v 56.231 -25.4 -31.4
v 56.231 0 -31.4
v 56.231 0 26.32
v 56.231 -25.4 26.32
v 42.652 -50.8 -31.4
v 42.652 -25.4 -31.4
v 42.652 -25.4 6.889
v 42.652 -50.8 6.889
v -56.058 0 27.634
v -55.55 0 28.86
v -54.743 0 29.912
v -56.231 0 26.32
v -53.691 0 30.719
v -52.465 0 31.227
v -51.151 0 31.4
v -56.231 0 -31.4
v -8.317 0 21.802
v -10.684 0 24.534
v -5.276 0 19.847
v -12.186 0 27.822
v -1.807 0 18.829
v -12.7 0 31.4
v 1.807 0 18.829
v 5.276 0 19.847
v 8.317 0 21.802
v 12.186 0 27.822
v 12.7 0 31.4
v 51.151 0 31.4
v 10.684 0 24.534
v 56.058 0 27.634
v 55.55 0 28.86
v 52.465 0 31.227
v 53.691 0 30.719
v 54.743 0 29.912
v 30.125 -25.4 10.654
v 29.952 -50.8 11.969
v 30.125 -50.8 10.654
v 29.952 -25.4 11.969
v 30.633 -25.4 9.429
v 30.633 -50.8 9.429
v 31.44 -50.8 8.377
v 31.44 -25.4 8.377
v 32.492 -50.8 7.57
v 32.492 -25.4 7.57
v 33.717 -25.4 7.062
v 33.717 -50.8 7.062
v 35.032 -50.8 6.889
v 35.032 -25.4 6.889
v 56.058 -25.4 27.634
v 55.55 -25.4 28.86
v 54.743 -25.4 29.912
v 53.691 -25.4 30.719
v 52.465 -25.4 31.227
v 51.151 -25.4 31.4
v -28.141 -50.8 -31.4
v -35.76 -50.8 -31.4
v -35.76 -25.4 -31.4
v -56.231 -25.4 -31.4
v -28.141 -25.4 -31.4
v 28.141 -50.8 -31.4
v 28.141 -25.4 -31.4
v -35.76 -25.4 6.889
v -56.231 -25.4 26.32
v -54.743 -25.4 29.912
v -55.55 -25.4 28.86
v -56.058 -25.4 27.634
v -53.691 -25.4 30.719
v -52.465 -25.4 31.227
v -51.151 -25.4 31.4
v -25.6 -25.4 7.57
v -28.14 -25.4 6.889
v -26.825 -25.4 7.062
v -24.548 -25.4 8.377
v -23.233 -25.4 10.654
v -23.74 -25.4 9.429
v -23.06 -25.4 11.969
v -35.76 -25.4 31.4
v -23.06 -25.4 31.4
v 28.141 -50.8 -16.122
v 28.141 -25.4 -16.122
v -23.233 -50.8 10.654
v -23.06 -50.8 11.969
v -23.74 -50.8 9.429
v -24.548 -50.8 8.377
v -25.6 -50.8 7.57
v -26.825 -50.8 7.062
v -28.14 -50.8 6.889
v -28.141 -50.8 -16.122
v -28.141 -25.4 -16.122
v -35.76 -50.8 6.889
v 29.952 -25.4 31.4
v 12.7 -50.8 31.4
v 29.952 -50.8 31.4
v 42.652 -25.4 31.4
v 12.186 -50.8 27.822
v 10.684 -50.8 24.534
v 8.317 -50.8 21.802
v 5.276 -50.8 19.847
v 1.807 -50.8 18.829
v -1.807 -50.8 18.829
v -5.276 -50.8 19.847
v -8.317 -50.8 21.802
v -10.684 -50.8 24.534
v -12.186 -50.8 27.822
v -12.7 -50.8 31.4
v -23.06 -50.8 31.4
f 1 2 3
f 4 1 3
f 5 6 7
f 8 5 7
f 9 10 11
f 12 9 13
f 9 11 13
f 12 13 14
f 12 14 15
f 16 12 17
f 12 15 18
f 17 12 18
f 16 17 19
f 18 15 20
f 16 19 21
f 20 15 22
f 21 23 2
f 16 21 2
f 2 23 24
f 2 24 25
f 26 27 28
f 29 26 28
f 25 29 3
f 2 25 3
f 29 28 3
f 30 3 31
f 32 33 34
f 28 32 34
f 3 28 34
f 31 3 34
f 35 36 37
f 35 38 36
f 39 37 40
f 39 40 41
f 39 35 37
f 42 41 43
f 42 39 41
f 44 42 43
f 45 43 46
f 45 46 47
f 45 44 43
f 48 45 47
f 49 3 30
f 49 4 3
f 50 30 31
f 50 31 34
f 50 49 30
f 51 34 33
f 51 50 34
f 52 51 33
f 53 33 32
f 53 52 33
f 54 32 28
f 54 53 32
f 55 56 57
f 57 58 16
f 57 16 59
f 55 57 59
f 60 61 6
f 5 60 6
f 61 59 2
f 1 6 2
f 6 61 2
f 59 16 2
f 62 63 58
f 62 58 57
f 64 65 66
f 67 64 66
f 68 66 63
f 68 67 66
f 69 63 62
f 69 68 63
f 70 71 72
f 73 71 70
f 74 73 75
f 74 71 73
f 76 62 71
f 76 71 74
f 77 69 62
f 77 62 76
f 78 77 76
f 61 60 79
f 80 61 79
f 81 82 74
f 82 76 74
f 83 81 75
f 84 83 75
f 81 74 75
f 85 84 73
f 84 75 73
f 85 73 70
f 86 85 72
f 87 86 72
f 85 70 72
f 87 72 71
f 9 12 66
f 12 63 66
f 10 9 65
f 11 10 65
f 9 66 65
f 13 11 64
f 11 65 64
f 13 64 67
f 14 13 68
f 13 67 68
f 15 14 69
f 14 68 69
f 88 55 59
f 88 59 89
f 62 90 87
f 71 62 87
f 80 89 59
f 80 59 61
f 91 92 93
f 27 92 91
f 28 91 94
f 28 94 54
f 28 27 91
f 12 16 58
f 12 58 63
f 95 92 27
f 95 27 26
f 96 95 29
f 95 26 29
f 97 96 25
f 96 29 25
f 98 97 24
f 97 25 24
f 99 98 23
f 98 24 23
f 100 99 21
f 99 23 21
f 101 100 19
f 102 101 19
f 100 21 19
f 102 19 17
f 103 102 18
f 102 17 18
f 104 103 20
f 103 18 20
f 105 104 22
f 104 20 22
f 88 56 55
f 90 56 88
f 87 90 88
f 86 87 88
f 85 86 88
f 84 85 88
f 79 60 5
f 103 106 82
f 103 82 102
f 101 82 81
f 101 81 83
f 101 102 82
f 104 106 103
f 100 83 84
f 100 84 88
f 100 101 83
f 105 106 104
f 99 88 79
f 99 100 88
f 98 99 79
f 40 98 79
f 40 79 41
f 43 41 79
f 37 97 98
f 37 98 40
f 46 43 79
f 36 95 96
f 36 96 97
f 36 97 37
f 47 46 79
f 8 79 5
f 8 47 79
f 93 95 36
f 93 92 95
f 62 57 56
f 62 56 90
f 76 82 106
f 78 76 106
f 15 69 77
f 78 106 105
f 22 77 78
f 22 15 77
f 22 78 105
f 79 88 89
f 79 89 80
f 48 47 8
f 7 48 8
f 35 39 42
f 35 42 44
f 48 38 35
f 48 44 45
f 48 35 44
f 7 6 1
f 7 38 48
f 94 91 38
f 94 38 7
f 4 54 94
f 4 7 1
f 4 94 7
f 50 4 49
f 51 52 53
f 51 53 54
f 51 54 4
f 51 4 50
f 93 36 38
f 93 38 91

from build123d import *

# Parameters (mm, degrees)
F0_W      = 112.4612912536
F0_H      = 62.7993419766
F1_DEPTH  = 25.4
F2_R      = 5.08
F3_W      = 78.4117951989
F3_H      = 62.7993419766
F4_DEPTH  = 25.4
F5_W      = 12.7
F5_H      = 50.8
F7_W      = 56.2817417085
F7_H      = 15.2776930481
F8_DEPTH  = 25.4
F9_W      = 12.7
F9_H      = 24.5103910565
F10_DEPTH = 25.4
F11_R     = 5.08
F12_R     = 5.08


with BuildPart() as f1:
    # F0 (on Front) → F1 (new body)
    with BuildSketch(Plane.XZ):
        Rectangle(F0_W, F0_H)
    extrude(amount=F1_DEPTH)

    # F2
    f2_edges = [f1.edges().sort_by_distance(p)[0] for p in [
        (-56.230646, -12.7, 31.399671),
        (56.230646, -12.7, 31.399671),
    ]]
    fillet(f2_edges, radius=F2_R)

    # F3 (on face) → F4 (join)
    with BuildSketch(Plane.XZ.offset(25.4)):
        with Locations((3.4460537136, 0)):
            Rectangle(F3_W, F3_H)
    extrude(amount=F4_DEPTH)

    # F5 (on face) → F6 (revolve, cut)
    with BuildSketch(Plane.XY.offset(31.3996709883)):
        with Locations((-6.35, -25.4)):
            Rectangle(F5_W, F5_H)
    revolve(axis=Axis((0, -25.4, 31.3996709883), (0, 1, 0)), mode=Mode.SUBTRACT)

    # F7 (on face) → F8 (cut)
    with BuildSketch(Plane.XZ.offset(50.8)):
        with Locations((0, -23.7608244643)):
            Rectangle(F7_W, F7_H)
    extrude(amount=-F8_DEPTH, mode=Mode.SUBTRACT)

    # F9 (on face) → F10 (cut)
    with BuildSketch(Plane.XZ.offset(50.8)):
        with Locations((-29.4098438859, 19.1444754601)):
            Rectangle(F9_W, F9_H)
        with Locations((36.301951313, 19.1444754601)):
            Rectangle(F9_W, F9_H)
    extrude(amount=-F10_DEPTH, mode=Mode.SUBTRACT)

    # F11
    f11_edges = [f1.edges().sort_by_distance(p)[0] for p in [
        (-23.059844, -38.1, 6.88928),
    ]]
    fillet(f11_edges, radius=F11_R)

    # F12
    f12_edges = [f1.edges().sort_by_distance(p)[0] for p in [
        (29.951951, -38.1, 6.88928),
    ]]
    fillet(f12_edges, radius=F12_R)


solid = f1.part
